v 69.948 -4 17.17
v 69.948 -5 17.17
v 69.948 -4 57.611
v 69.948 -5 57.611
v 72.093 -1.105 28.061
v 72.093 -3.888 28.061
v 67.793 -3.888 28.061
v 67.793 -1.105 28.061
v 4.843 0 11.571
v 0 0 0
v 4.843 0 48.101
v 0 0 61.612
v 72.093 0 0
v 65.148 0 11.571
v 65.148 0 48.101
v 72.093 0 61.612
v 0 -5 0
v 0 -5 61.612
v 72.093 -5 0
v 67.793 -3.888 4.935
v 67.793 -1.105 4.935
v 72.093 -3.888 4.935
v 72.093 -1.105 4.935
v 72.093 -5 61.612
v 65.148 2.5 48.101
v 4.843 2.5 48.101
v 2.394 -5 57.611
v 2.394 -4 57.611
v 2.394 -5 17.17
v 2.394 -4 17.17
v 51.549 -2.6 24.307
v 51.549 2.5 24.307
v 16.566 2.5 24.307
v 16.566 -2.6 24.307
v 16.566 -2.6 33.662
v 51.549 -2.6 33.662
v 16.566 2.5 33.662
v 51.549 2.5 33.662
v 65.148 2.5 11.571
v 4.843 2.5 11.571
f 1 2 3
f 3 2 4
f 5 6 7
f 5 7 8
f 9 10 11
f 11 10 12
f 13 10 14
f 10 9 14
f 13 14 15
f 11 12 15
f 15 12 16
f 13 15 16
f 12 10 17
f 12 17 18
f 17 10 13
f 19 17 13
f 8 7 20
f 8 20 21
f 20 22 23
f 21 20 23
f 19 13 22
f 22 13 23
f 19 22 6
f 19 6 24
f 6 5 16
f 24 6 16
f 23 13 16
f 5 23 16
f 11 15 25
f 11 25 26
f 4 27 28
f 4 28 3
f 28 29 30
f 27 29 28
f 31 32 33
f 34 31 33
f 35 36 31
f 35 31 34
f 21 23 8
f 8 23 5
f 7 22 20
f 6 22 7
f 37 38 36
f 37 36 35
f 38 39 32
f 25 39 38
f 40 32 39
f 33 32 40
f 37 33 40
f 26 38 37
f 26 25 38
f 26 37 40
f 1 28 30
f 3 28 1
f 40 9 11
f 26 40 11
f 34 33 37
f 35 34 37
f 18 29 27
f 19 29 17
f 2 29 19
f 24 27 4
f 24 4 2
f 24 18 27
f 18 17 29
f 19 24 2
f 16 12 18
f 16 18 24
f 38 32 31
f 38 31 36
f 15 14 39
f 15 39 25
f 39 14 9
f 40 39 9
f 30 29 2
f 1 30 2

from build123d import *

# Parameters (mm, degrees)
F0_W      = 72.093084
F0_H      = 61.611962
F1_DEPTH  = 5
F3_W      = 67.553579
F3_H      = 40.44101
F4_DEPTH  = 1
F5_W      = 60.304923
F5_H      = 36.530194
F6_DEPTH  = 2.5
F7_W      = 34.983285
F7_H      = 9.354526
F8_DEPTH  = 5.1
F9_W      = 2.782536
F9_H      = 23.125896
F10_DEPTH = 4.3


with BuildPart() as f1:
    # F0 (on Front) → F1 (new body)
    with BuildSketch(Plane.XZ):
        with Locations((36.046542, 30.805981)):
            Rectangle(F0_W, F0_H)
    extrude(amount=F1_DEPTH)

    # F3 (on face) → F4 (cut)
    with BuildSketch(Plane.XZ.offset(5)):
        with Locations((36.171169, 37.390875)):
            Rectangle(F3_W, F3_H)
    extrude(amount=-F4_DEPTH, mode=Mode.SUBTRACT)

    # F5 (on face) → F6 (join)
    with BuildSketch(Plane(origin=(0, 0, 0), x_dir=(-1, 0, 0), z_dir=(0, 1, 0))):
        with Locations((-34.995176, 29.835877)):
            Rectangle(F5_W, F5_H)
    extrude(amount=F6_DEPTH)

    # F7 (on face) → F8 (cut)
    with BuildSketch(Plane(origin=(0, 2.5, 0), x_dir=(-1, 0, 0), z_dir=(0, 1, 0))):
        with Locations((-34.057569, 28.984568)):
            Rectangle(F7_W, F7_H)
    extrude(amount=-F8_DEPTH, mode=Mode.SUBTRACT)

    # F9 (on face) → F10 (cut)
    with BuildSketch(Plane.YZ.offset(72.093084)):
        with Locations((-2.496595, 16.498187)):
            Rectangle(F9_W, F9_H)
    extrude(amount=-F10_DEPTH, mode=Mode.SUBTRACT)


solid = f1.part
